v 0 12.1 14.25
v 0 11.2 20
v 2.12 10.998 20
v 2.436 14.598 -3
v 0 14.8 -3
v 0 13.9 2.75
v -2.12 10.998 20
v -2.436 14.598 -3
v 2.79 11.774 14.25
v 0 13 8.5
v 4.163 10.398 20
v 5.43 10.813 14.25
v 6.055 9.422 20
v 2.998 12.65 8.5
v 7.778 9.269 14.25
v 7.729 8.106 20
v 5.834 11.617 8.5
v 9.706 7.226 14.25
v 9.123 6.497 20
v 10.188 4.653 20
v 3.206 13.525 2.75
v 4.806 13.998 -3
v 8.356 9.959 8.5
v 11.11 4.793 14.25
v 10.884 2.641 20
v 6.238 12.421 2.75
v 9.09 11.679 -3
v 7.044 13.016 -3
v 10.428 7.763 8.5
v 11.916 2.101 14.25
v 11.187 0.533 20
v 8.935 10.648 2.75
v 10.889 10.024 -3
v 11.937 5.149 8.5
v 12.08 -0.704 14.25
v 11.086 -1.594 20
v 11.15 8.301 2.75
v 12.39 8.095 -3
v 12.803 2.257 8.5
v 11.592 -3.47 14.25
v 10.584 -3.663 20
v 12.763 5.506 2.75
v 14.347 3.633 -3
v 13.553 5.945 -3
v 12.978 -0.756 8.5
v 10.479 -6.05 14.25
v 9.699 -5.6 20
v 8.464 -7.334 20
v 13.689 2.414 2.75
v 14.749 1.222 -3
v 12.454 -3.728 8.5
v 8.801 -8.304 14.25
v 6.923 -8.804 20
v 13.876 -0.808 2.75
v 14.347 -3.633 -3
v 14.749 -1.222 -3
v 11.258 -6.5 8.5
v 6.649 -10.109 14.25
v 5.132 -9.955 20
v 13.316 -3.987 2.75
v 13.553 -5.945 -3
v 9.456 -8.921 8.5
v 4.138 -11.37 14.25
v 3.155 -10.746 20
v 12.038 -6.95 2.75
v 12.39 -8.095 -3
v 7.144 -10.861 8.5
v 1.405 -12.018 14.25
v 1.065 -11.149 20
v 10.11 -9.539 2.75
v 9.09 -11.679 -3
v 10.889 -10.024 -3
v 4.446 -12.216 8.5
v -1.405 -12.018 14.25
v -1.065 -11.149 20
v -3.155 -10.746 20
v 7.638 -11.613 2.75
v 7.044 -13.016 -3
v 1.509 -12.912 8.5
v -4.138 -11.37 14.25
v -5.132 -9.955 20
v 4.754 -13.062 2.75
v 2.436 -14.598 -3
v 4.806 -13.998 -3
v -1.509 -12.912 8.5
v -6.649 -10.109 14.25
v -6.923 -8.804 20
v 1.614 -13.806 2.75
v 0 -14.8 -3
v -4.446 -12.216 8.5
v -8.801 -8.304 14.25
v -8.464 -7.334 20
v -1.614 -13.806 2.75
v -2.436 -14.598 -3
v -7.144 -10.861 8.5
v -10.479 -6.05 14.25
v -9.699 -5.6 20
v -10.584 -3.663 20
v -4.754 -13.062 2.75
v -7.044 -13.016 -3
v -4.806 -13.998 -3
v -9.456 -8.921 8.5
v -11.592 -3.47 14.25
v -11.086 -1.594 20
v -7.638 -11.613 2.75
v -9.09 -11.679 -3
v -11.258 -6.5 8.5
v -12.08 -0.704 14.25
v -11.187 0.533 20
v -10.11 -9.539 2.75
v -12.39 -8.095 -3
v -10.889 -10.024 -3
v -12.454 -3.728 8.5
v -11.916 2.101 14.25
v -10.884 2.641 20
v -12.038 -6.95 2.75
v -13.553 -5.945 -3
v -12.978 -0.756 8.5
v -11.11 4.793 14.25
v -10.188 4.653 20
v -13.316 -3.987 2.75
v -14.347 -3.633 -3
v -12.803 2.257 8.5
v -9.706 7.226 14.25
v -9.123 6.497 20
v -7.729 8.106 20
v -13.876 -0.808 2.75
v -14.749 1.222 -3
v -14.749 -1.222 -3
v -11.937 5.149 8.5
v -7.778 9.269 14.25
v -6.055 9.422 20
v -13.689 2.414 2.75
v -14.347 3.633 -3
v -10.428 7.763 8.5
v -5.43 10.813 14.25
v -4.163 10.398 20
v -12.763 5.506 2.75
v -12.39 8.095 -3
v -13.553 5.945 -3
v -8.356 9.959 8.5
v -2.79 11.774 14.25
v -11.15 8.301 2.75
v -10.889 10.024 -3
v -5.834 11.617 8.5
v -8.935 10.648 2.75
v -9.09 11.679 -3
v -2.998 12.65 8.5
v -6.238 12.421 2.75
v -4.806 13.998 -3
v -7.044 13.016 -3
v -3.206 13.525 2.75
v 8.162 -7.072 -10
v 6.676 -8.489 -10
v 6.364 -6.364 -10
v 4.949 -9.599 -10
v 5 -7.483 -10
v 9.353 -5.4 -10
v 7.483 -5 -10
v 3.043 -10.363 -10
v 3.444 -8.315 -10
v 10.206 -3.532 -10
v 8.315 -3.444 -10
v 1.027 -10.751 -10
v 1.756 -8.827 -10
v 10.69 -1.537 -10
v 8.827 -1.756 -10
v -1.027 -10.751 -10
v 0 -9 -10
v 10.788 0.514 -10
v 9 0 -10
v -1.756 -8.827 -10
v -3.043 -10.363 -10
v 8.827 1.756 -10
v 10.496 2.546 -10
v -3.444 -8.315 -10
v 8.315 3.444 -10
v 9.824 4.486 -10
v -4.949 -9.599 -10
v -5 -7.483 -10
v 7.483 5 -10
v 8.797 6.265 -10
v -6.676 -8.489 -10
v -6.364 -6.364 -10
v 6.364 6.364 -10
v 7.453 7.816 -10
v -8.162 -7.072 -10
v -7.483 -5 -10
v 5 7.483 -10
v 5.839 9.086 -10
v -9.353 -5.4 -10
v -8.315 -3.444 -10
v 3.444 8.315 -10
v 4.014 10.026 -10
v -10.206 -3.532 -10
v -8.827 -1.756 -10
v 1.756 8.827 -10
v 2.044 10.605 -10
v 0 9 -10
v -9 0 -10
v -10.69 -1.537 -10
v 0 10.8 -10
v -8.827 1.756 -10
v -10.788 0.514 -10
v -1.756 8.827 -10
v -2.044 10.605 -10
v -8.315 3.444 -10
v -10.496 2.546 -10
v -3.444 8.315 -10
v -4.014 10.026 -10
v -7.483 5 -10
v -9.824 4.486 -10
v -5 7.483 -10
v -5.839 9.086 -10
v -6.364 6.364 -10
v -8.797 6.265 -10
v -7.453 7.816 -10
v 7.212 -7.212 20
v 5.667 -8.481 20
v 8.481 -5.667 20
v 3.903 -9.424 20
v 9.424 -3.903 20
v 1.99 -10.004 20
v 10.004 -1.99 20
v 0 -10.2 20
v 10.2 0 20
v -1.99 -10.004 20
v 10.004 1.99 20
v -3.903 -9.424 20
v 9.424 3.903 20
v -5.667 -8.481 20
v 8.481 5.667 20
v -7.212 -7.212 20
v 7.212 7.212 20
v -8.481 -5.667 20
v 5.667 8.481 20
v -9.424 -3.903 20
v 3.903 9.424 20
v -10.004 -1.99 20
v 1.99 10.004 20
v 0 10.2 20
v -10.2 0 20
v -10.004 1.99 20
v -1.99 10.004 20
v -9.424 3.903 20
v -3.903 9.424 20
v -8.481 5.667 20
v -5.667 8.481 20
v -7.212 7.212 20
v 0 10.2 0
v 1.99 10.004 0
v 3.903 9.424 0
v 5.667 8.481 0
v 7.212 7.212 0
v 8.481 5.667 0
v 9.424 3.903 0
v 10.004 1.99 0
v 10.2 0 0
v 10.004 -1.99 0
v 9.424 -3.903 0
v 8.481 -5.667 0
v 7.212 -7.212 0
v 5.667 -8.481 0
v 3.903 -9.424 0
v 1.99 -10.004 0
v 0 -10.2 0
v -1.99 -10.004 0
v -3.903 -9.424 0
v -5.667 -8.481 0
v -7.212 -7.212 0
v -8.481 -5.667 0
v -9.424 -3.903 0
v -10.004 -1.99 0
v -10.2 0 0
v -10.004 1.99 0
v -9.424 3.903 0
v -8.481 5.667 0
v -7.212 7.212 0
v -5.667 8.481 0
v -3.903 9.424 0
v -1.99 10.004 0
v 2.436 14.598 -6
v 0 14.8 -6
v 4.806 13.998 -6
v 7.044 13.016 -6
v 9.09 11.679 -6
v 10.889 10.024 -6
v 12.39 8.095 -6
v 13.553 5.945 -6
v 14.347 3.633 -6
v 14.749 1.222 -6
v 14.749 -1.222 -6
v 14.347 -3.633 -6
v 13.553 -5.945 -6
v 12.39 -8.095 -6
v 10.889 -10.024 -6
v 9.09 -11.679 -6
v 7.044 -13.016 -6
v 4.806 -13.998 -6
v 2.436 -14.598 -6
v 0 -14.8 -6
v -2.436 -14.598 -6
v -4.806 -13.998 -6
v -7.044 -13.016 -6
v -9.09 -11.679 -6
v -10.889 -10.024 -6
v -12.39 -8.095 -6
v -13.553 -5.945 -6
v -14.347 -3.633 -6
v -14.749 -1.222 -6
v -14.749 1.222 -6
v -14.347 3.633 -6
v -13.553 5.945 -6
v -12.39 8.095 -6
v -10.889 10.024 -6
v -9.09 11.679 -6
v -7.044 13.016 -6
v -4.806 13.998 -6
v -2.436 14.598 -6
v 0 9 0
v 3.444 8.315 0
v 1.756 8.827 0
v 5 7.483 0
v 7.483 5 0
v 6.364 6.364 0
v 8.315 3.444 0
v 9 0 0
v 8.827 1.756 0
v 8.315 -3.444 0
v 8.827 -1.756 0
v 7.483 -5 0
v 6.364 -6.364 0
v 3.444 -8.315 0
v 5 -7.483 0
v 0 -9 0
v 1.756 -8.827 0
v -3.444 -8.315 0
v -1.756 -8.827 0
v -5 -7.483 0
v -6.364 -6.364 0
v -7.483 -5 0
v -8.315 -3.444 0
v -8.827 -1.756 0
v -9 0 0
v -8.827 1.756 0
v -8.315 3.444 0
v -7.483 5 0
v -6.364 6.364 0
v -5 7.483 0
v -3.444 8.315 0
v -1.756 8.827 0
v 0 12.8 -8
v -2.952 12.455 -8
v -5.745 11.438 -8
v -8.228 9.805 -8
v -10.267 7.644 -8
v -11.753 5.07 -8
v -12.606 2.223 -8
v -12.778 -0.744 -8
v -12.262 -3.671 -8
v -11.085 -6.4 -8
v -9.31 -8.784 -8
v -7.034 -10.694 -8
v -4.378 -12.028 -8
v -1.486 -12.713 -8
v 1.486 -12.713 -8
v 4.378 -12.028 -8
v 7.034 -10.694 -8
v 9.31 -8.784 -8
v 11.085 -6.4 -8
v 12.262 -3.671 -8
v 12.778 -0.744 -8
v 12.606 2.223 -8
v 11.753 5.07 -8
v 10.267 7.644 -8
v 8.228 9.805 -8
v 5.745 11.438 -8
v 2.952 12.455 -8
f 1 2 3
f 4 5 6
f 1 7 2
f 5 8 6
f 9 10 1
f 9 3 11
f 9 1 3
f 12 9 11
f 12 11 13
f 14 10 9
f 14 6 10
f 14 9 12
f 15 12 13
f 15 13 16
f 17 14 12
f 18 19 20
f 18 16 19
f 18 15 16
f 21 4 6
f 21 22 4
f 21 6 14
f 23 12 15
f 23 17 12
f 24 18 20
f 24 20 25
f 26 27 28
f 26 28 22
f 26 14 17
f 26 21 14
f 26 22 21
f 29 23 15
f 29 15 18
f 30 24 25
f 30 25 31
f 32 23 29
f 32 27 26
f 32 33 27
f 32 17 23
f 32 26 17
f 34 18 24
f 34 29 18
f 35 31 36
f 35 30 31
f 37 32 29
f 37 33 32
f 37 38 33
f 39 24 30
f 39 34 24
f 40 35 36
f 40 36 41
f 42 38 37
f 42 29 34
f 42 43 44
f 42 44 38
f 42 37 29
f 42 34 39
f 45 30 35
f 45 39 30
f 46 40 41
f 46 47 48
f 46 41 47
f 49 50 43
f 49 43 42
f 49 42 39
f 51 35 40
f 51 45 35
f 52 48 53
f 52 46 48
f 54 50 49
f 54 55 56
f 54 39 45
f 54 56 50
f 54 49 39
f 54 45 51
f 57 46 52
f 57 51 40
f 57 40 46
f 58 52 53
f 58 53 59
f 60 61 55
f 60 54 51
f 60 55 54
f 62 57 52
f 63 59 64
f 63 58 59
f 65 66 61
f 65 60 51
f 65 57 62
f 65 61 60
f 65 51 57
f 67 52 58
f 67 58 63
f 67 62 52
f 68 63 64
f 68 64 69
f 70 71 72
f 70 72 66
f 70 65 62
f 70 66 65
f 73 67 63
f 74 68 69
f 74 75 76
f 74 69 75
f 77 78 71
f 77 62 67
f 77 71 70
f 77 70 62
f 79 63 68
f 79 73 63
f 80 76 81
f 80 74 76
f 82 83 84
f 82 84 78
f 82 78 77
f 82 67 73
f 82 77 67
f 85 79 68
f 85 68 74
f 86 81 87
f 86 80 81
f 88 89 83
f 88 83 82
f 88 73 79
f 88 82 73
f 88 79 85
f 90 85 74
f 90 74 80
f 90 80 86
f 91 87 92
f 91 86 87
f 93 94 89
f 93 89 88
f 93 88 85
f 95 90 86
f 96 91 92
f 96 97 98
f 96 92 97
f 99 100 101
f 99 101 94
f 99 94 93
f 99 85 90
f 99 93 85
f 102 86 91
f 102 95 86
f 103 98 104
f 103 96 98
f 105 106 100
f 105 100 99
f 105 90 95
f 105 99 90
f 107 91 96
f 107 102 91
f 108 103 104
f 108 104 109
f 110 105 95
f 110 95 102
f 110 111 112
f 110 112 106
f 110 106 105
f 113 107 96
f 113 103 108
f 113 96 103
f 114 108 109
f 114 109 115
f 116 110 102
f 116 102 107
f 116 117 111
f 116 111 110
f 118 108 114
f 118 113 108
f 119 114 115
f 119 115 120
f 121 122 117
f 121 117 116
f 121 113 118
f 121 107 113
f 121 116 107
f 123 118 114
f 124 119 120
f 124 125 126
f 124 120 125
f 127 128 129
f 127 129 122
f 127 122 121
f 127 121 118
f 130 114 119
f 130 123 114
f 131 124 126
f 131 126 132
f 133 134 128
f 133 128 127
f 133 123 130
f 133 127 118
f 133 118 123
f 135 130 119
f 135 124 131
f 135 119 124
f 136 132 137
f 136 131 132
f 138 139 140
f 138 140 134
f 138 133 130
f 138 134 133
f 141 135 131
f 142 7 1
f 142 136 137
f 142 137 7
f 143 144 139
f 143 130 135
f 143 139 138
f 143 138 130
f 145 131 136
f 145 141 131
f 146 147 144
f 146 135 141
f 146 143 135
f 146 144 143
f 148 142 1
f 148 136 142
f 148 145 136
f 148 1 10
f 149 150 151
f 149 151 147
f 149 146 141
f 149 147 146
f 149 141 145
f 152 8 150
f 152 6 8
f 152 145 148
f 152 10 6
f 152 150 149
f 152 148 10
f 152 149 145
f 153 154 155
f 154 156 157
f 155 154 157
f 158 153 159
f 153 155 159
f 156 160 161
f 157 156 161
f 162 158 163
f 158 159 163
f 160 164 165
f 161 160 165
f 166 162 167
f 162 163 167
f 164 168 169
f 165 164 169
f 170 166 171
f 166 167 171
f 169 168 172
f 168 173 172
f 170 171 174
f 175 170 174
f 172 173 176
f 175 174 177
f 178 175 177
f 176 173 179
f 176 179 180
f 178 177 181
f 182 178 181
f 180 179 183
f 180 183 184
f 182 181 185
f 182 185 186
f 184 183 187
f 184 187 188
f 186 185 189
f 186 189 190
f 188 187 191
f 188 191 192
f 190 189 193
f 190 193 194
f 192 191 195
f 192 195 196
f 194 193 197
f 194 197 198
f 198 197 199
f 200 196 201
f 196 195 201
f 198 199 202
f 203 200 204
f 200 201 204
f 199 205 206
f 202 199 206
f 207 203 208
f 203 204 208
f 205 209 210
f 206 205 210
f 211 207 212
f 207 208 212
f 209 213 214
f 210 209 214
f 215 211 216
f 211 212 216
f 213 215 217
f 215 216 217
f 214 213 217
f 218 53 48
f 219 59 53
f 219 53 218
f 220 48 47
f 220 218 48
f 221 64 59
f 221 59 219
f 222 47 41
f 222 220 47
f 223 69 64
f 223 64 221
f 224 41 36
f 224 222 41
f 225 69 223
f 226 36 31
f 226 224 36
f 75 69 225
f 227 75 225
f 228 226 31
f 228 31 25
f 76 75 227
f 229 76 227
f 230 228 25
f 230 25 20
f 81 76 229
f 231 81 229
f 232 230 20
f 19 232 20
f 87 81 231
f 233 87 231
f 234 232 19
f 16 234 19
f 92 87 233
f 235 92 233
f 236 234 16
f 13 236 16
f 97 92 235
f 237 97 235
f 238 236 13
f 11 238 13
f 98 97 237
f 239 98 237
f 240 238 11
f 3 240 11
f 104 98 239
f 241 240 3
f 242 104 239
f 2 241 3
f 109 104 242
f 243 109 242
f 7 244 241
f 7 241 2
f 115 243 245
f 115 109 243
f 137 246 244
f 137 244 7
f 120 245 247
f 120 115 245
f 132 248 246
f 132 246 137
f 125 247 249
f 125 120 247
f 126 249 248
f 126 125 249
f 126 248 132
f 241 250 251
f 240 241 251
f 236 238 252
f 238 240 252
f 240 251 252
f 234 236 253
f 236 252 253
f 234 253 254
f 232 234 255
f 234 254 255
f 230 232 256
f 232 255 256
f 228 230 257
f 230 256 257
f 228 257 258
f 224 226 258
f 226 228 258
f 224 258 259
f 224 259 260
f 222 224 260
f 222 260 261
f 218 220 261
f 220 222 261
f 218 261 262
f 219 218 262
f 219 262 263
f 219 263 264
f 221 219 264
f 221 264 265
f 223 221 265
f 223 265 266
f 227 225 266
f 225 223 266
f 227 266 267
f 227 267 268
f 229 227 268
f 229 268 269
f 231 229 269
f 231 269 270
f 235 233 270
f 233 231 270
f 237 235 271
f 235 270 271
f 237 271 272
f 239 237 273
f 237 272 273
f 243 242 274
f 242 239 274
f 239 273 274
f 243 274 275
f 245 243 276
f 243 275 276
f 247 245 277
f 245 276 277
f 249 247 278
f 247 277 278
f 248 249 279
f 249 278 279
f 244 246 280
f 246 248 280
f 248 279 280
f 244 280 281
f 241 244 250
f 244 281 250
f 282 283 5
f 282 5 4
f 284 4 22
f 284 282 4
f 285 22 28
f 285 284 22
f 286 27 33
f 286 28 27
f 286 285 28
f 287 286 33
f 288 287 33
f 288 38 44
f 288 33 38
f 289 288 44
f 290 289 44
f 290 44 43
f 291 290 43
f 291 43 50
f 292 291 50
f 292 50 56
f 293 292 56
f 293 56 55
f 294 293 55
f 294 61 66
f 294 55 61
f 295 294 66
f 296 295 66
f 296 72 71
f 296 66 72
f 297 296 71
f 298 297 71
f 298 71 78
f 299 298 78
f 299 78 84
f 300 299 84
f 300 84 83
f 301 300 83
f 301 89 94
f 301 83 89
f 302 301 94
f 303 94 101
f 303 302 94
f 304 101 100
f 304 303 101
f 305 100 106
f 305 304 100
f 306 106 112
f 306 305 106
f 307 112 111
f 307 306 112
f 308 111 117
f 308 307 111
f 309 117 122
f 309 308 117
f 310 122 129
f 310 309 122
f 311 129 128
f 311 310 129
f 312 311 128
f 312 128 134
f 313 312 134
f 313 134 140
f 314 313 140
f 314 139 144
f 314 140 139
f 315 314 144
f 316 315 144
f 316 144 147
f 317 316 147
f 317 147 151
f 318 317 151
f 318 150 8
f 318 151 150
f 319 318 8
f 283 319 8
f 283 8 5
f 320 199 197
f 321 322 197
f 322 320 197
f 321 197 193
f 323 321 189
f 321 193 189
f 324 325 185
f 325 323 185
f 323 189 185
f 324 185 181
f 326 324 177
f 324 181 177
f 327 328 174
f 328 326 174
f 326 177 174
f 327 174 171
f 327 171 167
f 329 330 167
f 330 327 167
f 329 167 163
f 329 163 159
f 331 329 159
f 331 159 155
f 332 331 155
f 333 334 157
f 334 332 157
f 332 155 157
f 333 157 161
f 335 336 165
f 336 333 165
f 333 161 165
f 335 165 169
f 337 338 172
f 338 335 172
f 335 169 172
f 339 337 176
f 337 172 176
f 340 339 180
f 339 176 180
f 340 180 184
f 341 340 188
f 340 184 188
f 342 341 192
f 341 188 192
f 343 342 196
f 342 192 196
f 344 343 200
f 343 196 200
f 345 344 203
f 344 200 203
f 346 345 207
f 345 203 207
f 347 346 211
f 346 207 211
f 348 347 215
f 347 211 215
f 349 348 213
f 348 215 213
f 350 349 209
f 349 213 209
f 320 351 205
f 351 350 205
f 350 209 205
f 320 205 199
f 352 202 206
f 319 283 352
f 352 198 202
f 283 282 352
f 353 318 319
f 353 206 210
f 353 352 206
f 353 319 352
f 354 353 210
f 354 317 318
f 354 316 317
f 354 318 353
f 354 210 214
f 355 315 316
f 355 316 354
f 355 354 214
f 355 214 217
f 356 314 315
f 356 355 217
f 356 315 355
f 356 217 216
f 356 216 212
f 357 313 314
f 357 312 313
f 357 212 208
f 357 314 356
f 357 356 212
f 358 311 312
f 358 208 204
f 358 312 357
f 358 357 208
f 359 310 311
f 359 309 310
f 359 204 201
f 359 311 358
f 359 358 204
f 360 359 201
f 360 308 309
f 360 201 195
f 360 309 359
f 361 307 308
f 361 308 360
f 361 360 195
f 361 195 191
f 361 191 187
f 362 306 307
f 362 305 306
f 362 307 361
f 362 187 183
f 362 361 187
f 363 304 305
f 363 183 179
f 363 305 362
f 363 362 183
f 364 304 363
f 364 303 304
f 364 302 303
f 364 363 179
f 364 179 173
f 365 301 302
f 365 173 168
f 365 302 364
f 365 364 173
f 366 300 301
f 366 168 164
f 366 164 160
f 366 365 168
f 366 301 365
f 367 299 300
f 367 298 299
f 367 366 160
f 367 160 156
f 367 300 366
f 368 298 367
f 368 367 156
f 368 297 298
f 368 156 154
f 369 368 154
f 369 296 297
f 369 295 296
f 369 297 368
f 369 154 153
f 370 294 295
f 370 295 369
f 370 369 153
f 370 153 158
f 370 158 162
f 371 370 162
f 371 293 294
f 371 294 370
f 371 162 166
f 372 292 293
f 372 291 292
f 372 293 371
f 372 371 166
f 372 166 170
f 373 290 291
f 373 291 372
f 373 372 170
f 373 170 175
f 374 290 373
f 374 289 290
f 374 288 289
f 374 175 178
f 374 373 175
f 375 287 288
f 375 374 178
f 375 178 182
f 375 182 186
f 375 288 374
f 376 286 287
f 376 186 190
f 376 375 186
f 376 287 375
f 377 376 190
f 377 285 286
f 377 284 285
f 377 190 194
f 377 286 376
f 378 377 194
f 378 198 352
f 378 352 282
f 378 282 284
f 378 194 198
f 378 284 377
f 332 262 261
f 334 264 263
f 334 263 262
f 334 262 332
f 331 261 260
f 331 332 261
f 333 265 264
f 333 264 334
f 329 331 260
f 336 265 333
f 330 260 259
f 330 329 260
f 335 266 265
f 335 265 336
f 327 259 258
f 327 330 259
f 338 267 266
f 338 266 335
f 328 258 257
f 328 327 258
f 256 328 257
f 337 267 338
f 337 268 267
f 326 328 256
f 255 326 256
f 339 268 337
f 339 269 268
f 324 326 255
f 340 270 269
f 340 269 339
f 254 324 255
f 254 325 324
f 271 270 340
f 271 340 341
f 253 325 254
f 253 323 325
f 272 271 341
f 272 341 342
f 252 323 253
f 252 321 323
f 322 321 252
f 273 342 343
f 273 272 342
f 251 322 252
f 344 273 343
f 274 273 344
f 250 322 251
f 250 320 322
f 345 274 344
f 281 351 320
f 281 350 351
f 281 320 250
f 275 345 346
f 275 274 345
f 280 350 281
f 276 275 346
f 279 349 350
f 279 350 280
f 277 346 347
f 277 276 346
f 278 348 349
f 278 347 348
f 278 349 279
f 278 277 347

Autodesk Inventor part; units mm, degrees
ref_plane "YZ Plane" through (0, 0, 0) normal (1, 0, 0) x (0, 1, 0)
ref_plane "XZ Plane" through (0, 0, 0) normal (0, 1, 0) x (-1, 0, 0)
ref_plane "XY Plane" through (0, 0, 0) normal (0, 0, 1) x (1, 0, 0)
sketch "スケッチ1" plane through (0, 0, 0) normal (1, 0, 0) x (0, 1, 0)
  line L0 (10.2, 20) -> (10.2, 0)
  line L1 (10.2, 0) -> (9, 0)
  line L2 (9, 0) -> (9, -10)
  line L3 (9, -10) -> (14.8, -10)
  line L4 (0, -16) -> (0, 26) projected
  line L5 (10.2, 20) -> (14.8, 20)
  line L6 (14.8, 20) -> (14.8, -10)
  point P0 (0, 0)
  dimension "d2" = 10
  dimension "d3" = 10.2
  dimension "d12" = 9
  dimension "d14" = 14.8
  dimension "d15" = 20
revolve "回転1" add sketch "スケッチ1" angle 360 about axis through (0, 0, -10) along (0, 0, 1)
thread "ねじ1" size "M18x2" class "6H" standard "ISO Metric profile" full length
chamfer "面取り1" distance 23 distance2 3.6 1 edges at (0, -14.8, 20) measured on face at (1.1909, 14.752, 0)
chamfer "面取り2" distance 4 angle 45 1 edges at (0, -14.8, -10)
properties part number "rod330_end_cap" material "ステンレス鋼"
